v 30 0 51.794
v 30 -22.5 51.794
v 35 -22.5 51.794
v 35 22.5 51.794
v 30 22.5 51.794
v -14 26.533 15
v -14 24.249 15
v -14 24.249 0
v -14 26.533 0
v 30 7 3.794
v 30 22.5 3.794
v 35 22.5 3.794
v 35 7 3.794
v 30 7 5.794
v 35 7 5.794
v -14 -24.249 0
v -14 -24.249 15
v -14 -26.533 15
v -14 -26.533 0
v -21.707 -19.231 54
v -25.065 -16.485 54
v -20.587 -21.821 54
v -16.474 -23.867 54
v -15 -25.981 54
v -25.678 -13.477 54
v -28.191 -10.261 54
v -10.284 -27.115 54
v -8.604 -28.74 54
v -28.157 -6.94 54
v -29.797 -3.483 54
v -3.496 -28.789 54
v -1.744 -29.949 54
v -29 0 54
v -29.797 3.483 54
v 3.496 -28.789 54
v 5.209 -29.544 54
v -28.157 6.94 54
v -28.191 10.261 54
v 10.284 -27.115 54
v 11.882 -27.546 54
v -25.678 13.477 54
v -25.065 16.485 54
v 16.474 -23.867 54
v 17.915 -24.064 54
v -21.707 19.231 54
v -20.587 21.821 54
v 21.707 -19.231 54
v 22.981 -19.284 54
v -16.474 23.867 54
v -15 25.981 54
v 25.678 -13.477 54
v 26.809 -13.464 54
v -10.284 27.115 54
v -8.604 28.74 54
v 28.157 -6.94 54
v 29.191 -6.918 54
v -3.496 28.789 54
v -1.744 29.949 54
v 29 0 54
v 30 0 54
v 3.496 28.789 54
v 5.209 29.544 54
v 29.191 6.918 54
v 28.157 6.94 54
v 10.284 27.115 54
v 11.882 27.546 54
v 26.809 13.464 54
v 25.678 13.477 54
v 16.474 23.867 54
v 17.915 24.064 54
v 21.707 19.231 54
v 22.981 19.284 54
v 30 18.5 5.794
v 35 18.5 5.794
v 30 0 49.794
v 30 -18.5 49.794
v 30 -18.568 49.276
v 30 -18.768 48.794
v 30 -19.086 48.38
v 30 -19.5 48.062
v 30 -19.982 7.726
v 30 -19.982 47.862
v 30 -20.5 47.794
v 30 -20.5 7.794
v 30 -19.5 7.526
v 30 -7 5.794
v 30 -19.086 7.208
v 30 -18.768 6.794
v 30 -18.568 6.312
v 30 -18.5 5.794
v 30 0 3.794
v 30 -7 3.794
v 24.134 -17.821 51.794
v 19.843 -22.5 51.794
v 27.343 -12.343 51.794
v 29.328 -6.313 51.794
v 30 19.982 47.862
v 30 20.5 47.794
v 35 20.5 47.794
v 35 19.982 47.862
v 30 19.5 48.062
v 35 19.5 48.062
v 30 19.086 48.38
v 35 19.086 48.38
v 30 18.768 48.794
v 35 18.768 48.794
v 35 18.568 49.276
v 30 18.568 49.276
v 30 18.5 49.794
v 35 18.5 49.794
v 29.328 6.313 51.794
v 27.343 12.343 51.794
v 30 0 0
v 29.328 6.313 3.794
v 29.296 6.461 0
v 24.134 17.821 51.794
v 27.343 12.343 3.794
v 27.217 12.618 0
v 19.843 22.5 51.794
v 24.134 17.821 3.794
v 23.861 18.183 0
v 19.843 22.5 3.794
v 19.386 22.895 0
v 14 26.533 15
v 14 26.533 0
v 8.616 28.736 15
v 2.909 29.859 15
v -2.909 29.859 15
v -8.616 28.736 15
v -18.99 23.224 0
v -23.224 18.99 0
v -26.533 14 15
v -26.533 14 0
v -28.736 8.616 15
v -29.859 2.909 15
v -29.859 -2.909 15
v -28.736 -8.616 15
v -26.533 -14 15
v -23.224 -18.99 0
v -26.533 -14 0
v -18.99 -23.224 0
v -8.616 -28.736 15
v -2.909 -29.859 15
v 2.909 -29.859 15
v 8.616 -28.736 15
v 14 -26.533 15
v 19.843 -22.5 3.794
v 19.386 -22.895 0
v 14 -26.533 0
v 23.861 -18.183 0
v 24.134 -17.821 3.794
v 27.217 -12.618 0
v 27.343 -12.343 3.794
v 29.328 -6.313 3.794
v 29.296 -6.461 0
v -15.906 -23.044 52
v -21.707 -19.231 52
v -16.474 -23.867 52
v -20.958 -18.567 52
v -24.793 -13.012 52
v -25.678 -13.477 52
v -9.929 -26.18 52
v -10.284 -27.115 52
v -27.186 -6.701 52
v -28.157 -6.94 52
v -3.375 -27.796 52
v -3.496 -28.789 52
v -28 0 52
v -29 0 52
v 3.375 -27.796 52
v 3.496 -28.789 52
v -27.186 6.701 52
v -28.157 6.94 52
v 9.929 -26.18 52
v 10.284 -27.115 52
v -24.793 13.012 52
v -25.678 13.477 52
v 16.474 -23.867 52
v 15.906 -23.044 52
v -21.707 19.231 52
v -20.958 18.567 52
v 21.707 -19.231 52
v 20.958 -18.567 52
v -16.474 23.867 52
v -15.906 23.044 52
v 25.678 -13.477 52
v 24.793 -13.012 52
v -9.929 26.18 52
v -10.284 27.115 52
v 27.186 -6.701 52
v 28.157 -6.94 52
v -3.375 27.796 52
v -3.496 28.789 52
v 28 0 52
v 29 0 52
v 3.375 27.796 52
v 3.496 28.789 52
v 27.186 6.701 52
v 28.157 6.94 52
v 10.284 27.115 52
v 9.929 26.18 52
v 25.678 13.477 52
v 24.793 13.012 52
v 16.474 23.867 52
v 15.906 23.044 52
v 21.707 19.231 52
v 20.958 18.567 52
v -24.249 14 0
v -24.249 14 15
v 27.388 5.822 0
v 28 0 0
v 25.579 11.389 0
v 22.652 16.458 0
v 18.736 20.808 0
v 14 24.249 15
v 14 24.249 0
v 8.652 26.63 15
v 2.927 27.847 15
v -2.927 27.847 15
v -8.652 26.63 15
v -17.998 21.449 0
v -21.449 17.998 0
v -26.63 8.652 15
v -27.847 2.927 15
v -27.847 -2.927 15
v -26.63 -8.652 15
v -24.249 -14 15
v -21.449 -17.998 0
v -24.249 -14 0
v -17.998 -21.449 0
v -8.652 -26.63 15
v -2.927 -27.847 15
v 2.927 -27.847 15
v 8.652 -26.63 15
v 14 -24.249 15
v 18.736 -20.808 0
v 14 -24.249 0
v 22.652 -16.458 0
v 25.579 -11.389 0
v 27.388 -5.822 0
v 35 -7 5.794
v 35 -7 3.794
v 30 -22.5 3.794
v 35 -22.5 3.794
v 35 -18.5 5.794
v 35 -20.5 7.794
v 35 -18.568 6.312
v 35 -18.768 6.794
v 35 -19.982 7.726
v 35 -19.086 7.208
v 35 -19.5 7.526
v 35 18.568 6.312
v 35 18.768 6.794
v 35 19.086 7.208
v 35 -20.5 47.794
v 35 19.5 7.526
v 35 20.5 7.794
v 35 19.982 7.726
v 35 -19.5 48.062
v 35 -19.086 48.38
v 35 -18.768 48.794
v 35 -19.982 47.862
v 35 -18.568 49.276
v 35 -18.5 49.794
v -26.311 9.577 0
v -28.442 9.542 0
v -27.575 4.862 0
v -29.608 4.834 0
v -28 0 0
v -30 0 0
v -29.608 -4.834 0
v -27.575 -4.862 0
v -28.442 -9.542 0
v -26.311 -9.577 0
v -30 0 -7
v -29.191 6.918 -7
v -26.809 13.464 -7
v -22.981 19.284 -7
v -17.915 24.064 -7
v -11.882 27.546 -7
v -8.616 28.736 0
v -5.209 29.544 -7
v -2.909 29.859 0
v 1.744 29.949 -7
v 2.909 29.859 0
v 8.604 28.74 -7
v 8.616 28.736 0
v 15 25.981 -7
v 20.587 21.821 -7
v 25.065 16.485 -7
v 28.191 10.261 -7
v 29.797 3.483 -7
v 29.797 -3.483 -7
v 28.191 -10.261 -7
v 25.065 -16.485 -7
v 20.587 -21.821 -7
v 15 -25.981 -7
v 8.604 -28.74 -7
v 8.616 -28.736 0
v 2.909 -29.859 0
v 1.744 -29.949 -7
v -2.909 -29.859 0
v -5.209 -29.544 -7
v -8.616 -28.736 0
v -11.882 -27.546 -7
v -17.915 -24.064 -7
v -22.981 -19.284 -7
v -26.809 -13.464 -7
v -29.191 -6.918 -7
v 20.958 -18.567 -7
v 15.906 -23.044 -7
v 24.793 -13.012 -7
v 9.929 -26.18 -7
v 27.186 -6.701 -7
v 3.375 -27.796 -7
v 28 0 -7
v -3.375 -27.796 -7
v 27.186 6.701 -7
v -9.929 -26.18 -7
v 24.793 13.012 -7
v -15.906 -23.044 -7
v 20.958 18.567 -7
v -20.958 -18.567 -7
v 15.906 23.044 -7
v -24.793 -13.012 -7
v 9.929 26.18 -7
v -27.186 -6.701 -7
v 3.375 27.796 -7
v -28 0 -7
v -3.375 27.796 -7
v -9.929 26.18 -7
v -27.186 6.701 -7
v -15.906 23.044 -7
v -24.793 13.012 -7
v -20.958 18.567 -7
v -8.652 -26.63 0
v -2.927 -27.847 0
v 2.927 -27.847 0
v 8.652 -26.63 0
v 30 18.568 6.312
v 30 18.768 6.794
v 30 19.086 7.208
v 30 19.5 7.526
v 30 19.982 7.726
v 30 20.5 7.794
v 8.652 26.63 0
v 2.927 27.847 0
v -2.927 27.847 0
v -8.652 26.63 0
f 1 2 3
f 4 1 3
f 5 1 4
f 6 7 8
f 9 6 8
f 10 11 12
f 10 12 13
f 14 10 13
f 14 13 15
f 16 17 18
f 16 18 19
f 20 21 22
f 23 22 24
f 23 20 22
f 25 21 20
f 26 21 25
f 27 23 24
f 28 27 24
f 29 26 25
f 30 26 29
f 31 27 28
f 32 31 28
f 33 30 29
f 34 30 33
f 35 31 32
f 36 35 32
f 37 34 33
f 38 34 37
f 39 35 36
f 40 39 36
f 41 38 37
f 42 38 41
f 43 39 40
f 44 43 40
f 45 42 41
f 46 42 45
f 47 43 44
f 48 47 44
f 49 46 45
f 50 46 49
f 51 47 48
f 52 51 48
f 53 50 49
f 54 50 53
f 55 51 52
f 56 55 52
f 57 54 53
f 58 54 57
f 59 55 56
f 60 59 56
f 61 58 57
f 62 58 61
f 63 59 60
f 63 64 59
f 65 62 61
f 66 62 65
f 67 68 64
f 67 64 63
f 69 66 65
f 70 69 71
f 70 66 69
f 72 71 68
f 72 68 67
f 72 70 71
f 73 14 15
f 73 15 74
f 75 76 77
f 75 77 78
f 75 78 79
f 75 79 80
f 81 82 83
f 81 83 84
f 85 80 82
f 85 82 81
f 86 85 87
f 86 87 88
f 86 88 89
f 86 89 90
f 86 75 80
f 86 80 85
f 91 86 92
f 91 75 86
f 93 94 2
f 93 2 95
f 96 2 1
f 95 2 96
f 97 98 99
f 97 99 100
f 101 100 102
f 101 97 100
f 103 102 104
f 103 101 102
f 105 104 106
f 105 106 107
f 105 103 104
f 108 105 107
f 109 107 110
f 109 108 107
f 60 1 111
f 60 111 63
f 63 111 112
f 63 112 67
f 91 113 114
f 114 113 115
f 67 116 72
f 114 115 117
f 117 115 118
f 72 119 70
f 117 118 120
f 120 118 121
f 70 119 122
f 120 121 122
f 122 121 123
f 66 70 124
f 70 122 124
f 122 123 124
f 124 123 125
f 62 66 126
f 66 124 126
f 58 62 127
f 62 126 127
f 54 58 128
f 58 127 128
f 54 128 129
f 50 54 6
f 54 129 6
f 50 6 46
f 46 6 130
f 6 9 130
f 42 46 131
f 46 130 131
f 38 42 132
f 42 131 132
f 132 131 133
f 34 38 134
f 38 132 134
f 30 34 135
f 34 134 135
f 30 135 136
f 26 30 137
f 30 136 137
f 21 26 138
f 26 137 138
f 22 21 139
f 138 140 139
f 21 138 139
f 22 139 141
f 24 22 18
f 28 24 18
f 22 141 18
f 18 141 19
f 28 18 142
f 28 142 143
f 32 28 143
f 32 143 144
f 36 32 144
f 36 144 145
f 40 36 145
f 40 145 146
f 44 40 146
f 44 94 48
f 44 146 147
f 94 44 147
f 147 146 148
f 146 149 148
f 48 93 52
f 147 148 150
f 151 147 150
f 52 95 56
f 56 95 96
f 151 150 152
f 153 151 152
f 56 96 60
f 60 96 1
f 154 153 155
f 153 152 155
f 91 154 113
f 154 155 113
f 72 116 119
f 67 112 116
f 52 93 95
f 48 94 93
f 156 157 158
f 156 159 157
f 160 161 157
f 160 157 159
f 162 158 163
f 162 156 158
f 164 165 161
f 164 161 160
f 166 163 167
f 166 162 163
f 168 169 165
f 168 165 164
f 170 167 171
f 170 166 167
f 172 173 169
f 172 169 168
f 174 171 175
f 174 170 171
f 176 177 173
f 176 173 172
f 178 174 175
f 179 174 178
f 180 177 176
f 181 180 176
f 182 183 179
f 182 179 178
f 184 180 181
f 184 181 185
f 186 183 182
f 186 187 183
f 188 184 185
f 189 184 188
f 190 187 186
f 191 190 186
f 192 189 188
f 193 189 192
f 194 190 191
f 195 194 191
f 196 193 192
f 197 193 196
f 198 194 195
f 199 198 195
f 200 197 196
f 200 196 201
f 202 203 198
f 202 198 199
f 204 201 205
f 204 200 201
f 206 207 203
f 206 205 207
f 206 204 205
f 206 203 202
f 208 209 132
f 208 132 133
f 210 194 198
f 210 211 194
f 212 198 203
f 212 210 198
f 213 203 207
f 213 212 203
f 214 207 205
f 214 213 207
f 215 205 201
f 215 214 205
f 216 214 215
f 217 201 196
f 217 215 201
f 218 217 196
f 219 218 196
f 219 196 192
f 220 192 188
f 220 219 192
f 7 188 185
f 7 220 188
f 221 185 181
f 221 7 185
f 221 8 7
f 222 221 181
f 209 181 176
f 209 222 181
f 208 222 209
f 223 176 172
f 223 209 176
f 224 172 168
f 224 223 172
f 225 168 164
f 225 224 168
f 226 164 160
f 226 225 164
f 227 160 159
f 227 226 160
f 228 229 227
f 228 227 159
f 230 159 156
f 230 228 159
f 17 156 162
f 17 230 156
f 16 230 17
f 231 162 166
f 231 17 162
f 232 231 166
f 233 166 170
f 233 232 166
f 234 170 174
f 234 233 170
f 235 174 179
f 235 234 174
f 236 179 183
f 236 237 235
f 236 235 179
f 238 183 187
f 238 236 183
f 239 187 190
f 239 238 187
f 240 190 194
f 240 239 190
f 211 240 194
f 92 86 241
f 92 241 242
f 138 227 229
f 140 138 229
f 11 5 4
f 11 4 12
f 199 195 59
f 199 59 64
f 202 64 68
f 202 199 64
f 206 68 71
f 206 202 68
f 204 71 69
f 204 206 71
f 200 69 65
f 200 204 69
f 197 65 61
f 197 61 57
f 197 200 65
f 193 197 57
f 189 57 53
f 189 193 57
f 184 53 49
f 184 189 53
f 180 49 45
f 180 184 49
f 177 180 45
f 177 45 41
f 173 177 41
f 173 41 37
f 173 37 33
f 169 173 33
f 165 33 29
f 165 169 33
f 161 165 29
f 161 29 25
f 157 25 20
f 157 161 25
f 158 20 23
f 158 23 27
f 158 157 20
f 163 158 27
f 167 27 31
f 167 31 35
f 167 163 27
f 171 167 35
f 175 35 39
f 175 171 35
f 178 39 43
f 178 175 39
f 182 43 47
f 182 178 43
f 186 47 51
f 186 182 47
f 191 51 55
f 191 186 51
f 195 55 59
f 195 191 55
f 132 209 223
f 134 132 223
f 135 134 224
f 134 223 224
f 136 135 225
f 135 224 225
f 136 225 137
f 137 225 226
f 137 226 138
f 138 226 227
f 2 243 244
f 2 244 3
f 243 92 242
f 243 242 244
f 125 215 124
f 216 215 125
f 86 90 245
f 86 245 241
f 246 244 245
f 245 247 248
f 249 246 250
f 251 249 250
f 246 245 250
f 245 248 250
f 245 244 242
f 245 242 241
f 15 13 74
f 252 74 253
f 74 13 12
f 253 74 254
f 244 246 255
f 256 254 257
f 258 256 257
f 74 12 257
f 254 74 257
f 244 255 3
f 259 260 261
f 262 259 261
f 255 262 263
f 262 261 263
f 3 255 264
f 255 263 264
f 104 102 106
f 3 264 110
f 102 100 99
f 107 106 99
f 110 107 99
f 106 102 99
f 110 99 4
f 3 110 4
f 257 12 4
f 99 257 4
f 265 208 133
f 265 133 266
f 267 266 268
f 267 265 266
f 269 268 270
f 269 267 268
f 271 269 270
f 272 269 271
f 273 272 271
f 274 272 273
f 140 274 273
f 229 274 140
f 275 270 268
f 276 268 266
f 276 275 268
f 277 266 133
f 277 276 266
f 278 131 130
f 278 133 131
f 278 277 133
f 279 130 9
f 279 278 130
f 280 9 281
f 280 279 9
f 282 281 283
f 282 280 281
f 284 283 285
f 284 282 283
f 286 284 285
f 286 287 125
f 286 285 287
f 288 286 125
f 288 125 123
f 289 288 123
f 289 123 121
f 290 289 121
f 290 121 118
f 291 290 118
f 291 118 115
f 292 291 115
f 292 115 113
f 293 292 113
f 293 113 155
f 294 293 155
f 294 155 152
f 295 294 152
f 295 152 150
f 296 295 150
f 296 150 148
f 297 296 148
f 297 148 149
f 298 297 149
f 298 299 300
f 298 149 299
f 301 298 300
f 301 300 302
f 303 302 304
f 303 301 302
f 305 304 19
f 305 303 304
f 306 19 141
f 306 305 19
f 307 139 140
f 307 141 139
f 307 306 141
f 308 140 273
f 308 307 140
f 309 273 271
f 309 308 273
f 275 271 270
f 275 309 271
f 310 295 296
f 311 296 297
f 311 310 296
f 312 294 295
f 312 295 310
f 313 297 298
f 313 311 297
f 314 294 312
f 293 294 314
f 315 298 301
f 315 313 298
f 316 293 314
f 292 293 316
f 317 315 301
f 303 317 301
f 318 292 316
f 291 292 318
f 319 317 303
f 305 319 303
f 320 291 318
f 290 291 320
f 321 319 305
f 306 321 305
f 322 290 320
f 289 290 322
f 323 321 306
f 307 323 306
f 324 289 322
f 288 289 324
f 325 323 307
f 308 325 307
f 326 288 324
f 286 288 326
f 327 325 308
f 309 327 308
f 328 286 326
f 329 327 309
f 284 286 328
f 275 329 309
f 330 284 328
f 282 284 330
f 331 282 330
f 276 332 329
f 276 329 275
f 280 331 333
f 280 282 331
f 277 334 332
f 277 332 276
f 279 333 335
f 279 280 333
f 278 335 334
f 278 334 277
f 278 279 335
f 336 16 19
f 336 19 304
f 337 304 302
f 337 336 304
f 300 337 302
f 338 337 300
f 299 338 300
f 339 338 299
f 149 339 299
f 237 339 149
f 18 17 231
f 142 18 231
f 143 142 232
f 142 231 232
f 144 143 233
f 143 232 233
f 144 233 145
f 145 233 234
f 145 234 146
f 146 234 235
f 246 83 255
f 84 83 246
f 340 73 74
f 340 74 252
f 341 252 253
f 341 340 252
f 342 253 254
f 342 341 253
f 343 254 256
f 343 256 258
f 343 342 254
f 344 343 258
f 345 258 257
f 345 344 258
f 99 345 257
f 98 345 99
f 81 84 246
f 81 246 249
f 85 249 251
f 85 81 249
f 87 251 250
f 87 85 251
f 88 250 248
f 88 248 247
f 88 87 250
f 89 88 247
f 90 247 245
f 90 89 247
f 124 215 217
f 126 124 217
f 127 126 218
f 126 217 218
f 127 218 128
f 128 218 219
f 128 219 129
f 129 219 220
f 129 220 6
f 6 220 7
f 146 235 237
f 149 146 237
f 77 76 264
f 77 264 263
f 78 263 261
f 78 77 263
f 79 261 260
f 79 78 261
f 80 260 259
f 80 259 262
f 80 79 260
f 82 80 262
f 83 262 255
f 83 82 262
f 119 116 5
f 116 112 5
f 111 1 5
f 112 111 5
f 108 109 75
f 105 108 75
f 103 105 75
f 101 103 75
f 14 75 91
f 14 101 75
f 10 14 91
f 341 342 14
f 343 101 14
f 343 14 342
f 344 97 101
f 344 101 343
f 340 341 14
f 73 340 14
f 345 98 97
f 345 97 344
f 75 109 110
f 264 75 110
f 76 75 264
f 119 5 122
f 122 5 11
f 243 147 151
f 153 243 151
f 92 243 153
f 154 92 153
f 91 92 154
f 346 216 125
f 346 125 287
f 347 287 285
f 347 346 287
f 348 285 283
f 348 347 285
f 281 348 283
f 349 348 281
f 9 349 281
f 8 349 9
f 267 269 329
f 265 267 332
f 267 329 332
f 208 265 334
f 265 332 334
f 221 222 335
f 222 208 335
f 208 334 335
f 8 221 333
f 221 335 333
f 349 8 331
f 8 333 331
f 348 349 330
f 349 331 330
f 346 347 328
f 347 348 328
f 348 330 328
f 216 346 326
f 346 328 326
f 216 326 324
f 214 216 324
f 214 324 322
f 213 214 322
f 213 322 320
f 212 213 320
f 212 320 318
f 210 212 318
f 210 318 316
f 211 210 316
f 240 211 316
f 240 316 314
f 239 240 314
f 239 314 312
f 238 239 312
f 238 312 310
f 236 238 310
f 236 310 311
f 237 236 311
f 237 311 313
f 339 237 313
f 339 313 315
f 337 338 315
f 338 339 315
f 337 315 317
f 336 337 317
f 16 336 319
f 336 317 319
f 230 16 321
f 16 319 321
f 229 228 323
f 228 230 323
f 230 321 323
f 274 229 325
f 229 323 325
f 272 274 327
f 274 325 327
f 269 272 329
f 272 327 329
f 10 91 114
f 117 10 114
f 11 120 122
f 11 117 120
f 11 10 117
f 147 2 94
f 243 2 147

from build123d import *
from build123d.topology import SkipClean

# Parameters (mm, degrees)
SKETCH_1_R               = 30
SKETCH_1_R_2             = 28
EXTRUDE_1_DEPTH          = 2
SKETCH_2_R               = 30
SKETCH_2_R_2             = 28
EXTRUDE_2_DEPTH          = 52
CUT_EXTRUDE_START        = -2
SKETCH_6_R               = 29
SKETCH_6_R_2             = 28
CUT_EXTRUDE_2_DEPTH      = 2
EXTRUDE_START            = 7
SKETCH_7_R               = 30
SKETCH_7_R_2             = 28
EXTRUDE_3_DEPTH          = 7
EXTRUDE_7_REACH          = 88.116
EXTRUDE_7_END_RADIUS     = 30
SKETCH_8_W               = 48
SKETCH_8_H               = 45
SKETCH_9_W               = 28
SKETCH_9_H               = 15
CUT_EXTRUDE_3_DEPTH      = 69.673138854
PATTERN_CIRCULAR_2_COUNT = 3
PATTERN_CIRCULAR_2_ANGLE = 180
EXTRUDE_8_DEPTH          = 5


with BuildPart() as part:
    # 草图1 → 凸台-拉伸1 (new body)
    with BuildSketch(Plane.XY):
        Circle(SKETCH_1_R)
        Circle(SKETCH_1_R_2, mode=Mode.SUBTRACT)
    extrude(amount=EXTRUDE_1_DEPTH)

    # 草图2 → 凸台-拉伸2 (add)
    with BuildSketch(Plane.XY.offset(2)):
        Circle(SKETCH_2_R)
        Circle(SKETCH_2_R_2, mode=Mode.SUBTRACT)
    extrude(amount=EXTRUDE_2_DEPTH)

    # 草图6 → 切除-拉伸2 (cut)
    with BuildSketch(Plane.XY.offset(54).offset(CUT_EXTRUDE_START)):
        Circle(SKETCH_6_R)
        Circle(SKETCH_6_R_2, mode=Mode.SUBTRACT)
    extrude(amount=CUT_EXTRUDE_2_DEPTH, mode=Mode.SUBTRACT)

    # 草图7 → 凸台-拉伸3 (add)
    with SkipClean():  # the faces are left unmerged after this step: merging them gives an invalid solid
        with BuildSketch(Plane(origin=(0, 0, 0), x_dir=(-1, 0, 0), z_dir=(0, 0, -1)).offset(EXTRUDE_START)):
            Circle(SKETCH_7_R)
            Circle(SKETCH_7_R_2, mode=Mode.SUBTRACT)
        extrude(amount=-EXTRUDE_3_DEPTH)

    # 凸台-拉伸7: up to this cylinder (the profile starts outside it)
    with SkipClean():  # the faces are left unmerged after this step: merging them gives an invalid solid
        extrude_7_end = Plane(origin=(0, 0, 27.794079), z_dir=(0, 0, -1)) * Cylinder(EXTRUDE_7_END_RADIUS, 237.232, mode=Mode.PRIVATE)
        # 草图8 → 凸台-拉伸7 (add, up to the surface)
        with BuildSketch(Plane(origin=(30, 0, 0), x_dir=(0, 0, -1), z_dir=(1, 0, 0)), mode=Mode.PRIVATE) as extrude_7_sk1:
            with Locations((-27.794078809, 0)):
                Rectangle(SKETCH_8_W, SKETCH_8_H)
        extrude_7_tool1 = extrude(extrude_7_sk1.sketch, amount=-EXTRUDE_7_REACH, mode=Mode.PRIVATE) - extrude_7_end
        add(extrude_7_tool1.solids().sort_by_distance((30, 0, 27.794079))[0])
        add(extrude_7_tool1.solids().sort_by_distance((30, 0, 27.794079))[1])

    # 草图9 → 切除-拉伸3 (cut, through all)
    with SkipClean():  # the faces are left unmerged after this step: merging them gives an invalid solid
        with BuildSketch(Plane(origin=(0, 0, 0), x_dir=(1, 0, 0), z_dir=(0, 1, 0))):
            with Locations((0, -7.5)):
                Rectangle(SKETCH_9_W, SKETCH_9_H)
        cut_extrude_3 = extrude(amount=-CUT_EXTRUDE_3_DEPTH, mode=Mode.SUBTRACT)

    # 阵列(圆周)2: 切除-拉伸3 ×3 about axis
    with SkipClean():  # the faces are left unmerged after this step: merging them gives an invalid solid
        pattern_circular_2_axis = Axis((0, 0, 0), (0, 0, -1))
        for i in range(1, PATTERN_CIRCULAR_2_COUNT):
            add(cut_extrude_3.rotate(pattern_circular_2_axis, i * PATTERN_CIRCULAR_2_ANGLE / (PATTERN_CIRCULAR_2_COUNT - 1)), mode=Mode.SUBTRACT)

    # 草图10 → 凸台-拉伸8 (add)
    with SkipClean():  # the faces are left unmerged after this step: merging them gives an invalid solid
        with BuildSketch(Plane(origin=(30, 0, 0), x_dir=(0, 0, -1), z_dir=(1, 0, 0))):
            with BuildLine():
                Line((-3.794078809, 22.5), (-3.794078809, 7))
                Line((-3.794078809, 7), (-5.794078809, 7))
                Line((-5.794078809, 7), (-5.794078809, 18.5))
                ThreePointArc((-5.794078809, 18.5), (-7.208292371, 19.085786438), (-7.794078809, 20.5))
                Line((-7.794078809, 20.5), (-47.794078809, 20.5))
                ThreePointArc((-47.794078809, 20.5), (-48.379865247, 19.085786438), (-49.794078809, 18.5))
                Line((-49.794078809, 18.5), (-49.794078809, -18.5))
                ThreePointArc((-49.794078809, -18.5), (-48.379865247, -19.085786438), (-47.794078809, -20.5))
                Line((-47.794078809, -20.5), (-7.794078809, -20.5))
                ThreePointArc((-7.794078809, -20.5), (-7.208292371, -19.085786438), (-5.794078809, -18.5))
                Line((-5.794078809, -18.5), (-5.794078809, -7))
                Line((-5.794078809, -7), (-3.794078809, -7))
                Line((-3.794078809, -7), (-3.794078809, -22.5))
                Line((-3.794078809, -22.5), (-51.794078809, -22.5))
                Line((-51.794078809, -22.5), (-51.794078809, 22.5))
                Line((-51.794078809, 22.5), (-3.794078809, 22.5))
            make_face()
        extrude(amount=EXTRUDE_8_DEPTH)


solid = part.part
